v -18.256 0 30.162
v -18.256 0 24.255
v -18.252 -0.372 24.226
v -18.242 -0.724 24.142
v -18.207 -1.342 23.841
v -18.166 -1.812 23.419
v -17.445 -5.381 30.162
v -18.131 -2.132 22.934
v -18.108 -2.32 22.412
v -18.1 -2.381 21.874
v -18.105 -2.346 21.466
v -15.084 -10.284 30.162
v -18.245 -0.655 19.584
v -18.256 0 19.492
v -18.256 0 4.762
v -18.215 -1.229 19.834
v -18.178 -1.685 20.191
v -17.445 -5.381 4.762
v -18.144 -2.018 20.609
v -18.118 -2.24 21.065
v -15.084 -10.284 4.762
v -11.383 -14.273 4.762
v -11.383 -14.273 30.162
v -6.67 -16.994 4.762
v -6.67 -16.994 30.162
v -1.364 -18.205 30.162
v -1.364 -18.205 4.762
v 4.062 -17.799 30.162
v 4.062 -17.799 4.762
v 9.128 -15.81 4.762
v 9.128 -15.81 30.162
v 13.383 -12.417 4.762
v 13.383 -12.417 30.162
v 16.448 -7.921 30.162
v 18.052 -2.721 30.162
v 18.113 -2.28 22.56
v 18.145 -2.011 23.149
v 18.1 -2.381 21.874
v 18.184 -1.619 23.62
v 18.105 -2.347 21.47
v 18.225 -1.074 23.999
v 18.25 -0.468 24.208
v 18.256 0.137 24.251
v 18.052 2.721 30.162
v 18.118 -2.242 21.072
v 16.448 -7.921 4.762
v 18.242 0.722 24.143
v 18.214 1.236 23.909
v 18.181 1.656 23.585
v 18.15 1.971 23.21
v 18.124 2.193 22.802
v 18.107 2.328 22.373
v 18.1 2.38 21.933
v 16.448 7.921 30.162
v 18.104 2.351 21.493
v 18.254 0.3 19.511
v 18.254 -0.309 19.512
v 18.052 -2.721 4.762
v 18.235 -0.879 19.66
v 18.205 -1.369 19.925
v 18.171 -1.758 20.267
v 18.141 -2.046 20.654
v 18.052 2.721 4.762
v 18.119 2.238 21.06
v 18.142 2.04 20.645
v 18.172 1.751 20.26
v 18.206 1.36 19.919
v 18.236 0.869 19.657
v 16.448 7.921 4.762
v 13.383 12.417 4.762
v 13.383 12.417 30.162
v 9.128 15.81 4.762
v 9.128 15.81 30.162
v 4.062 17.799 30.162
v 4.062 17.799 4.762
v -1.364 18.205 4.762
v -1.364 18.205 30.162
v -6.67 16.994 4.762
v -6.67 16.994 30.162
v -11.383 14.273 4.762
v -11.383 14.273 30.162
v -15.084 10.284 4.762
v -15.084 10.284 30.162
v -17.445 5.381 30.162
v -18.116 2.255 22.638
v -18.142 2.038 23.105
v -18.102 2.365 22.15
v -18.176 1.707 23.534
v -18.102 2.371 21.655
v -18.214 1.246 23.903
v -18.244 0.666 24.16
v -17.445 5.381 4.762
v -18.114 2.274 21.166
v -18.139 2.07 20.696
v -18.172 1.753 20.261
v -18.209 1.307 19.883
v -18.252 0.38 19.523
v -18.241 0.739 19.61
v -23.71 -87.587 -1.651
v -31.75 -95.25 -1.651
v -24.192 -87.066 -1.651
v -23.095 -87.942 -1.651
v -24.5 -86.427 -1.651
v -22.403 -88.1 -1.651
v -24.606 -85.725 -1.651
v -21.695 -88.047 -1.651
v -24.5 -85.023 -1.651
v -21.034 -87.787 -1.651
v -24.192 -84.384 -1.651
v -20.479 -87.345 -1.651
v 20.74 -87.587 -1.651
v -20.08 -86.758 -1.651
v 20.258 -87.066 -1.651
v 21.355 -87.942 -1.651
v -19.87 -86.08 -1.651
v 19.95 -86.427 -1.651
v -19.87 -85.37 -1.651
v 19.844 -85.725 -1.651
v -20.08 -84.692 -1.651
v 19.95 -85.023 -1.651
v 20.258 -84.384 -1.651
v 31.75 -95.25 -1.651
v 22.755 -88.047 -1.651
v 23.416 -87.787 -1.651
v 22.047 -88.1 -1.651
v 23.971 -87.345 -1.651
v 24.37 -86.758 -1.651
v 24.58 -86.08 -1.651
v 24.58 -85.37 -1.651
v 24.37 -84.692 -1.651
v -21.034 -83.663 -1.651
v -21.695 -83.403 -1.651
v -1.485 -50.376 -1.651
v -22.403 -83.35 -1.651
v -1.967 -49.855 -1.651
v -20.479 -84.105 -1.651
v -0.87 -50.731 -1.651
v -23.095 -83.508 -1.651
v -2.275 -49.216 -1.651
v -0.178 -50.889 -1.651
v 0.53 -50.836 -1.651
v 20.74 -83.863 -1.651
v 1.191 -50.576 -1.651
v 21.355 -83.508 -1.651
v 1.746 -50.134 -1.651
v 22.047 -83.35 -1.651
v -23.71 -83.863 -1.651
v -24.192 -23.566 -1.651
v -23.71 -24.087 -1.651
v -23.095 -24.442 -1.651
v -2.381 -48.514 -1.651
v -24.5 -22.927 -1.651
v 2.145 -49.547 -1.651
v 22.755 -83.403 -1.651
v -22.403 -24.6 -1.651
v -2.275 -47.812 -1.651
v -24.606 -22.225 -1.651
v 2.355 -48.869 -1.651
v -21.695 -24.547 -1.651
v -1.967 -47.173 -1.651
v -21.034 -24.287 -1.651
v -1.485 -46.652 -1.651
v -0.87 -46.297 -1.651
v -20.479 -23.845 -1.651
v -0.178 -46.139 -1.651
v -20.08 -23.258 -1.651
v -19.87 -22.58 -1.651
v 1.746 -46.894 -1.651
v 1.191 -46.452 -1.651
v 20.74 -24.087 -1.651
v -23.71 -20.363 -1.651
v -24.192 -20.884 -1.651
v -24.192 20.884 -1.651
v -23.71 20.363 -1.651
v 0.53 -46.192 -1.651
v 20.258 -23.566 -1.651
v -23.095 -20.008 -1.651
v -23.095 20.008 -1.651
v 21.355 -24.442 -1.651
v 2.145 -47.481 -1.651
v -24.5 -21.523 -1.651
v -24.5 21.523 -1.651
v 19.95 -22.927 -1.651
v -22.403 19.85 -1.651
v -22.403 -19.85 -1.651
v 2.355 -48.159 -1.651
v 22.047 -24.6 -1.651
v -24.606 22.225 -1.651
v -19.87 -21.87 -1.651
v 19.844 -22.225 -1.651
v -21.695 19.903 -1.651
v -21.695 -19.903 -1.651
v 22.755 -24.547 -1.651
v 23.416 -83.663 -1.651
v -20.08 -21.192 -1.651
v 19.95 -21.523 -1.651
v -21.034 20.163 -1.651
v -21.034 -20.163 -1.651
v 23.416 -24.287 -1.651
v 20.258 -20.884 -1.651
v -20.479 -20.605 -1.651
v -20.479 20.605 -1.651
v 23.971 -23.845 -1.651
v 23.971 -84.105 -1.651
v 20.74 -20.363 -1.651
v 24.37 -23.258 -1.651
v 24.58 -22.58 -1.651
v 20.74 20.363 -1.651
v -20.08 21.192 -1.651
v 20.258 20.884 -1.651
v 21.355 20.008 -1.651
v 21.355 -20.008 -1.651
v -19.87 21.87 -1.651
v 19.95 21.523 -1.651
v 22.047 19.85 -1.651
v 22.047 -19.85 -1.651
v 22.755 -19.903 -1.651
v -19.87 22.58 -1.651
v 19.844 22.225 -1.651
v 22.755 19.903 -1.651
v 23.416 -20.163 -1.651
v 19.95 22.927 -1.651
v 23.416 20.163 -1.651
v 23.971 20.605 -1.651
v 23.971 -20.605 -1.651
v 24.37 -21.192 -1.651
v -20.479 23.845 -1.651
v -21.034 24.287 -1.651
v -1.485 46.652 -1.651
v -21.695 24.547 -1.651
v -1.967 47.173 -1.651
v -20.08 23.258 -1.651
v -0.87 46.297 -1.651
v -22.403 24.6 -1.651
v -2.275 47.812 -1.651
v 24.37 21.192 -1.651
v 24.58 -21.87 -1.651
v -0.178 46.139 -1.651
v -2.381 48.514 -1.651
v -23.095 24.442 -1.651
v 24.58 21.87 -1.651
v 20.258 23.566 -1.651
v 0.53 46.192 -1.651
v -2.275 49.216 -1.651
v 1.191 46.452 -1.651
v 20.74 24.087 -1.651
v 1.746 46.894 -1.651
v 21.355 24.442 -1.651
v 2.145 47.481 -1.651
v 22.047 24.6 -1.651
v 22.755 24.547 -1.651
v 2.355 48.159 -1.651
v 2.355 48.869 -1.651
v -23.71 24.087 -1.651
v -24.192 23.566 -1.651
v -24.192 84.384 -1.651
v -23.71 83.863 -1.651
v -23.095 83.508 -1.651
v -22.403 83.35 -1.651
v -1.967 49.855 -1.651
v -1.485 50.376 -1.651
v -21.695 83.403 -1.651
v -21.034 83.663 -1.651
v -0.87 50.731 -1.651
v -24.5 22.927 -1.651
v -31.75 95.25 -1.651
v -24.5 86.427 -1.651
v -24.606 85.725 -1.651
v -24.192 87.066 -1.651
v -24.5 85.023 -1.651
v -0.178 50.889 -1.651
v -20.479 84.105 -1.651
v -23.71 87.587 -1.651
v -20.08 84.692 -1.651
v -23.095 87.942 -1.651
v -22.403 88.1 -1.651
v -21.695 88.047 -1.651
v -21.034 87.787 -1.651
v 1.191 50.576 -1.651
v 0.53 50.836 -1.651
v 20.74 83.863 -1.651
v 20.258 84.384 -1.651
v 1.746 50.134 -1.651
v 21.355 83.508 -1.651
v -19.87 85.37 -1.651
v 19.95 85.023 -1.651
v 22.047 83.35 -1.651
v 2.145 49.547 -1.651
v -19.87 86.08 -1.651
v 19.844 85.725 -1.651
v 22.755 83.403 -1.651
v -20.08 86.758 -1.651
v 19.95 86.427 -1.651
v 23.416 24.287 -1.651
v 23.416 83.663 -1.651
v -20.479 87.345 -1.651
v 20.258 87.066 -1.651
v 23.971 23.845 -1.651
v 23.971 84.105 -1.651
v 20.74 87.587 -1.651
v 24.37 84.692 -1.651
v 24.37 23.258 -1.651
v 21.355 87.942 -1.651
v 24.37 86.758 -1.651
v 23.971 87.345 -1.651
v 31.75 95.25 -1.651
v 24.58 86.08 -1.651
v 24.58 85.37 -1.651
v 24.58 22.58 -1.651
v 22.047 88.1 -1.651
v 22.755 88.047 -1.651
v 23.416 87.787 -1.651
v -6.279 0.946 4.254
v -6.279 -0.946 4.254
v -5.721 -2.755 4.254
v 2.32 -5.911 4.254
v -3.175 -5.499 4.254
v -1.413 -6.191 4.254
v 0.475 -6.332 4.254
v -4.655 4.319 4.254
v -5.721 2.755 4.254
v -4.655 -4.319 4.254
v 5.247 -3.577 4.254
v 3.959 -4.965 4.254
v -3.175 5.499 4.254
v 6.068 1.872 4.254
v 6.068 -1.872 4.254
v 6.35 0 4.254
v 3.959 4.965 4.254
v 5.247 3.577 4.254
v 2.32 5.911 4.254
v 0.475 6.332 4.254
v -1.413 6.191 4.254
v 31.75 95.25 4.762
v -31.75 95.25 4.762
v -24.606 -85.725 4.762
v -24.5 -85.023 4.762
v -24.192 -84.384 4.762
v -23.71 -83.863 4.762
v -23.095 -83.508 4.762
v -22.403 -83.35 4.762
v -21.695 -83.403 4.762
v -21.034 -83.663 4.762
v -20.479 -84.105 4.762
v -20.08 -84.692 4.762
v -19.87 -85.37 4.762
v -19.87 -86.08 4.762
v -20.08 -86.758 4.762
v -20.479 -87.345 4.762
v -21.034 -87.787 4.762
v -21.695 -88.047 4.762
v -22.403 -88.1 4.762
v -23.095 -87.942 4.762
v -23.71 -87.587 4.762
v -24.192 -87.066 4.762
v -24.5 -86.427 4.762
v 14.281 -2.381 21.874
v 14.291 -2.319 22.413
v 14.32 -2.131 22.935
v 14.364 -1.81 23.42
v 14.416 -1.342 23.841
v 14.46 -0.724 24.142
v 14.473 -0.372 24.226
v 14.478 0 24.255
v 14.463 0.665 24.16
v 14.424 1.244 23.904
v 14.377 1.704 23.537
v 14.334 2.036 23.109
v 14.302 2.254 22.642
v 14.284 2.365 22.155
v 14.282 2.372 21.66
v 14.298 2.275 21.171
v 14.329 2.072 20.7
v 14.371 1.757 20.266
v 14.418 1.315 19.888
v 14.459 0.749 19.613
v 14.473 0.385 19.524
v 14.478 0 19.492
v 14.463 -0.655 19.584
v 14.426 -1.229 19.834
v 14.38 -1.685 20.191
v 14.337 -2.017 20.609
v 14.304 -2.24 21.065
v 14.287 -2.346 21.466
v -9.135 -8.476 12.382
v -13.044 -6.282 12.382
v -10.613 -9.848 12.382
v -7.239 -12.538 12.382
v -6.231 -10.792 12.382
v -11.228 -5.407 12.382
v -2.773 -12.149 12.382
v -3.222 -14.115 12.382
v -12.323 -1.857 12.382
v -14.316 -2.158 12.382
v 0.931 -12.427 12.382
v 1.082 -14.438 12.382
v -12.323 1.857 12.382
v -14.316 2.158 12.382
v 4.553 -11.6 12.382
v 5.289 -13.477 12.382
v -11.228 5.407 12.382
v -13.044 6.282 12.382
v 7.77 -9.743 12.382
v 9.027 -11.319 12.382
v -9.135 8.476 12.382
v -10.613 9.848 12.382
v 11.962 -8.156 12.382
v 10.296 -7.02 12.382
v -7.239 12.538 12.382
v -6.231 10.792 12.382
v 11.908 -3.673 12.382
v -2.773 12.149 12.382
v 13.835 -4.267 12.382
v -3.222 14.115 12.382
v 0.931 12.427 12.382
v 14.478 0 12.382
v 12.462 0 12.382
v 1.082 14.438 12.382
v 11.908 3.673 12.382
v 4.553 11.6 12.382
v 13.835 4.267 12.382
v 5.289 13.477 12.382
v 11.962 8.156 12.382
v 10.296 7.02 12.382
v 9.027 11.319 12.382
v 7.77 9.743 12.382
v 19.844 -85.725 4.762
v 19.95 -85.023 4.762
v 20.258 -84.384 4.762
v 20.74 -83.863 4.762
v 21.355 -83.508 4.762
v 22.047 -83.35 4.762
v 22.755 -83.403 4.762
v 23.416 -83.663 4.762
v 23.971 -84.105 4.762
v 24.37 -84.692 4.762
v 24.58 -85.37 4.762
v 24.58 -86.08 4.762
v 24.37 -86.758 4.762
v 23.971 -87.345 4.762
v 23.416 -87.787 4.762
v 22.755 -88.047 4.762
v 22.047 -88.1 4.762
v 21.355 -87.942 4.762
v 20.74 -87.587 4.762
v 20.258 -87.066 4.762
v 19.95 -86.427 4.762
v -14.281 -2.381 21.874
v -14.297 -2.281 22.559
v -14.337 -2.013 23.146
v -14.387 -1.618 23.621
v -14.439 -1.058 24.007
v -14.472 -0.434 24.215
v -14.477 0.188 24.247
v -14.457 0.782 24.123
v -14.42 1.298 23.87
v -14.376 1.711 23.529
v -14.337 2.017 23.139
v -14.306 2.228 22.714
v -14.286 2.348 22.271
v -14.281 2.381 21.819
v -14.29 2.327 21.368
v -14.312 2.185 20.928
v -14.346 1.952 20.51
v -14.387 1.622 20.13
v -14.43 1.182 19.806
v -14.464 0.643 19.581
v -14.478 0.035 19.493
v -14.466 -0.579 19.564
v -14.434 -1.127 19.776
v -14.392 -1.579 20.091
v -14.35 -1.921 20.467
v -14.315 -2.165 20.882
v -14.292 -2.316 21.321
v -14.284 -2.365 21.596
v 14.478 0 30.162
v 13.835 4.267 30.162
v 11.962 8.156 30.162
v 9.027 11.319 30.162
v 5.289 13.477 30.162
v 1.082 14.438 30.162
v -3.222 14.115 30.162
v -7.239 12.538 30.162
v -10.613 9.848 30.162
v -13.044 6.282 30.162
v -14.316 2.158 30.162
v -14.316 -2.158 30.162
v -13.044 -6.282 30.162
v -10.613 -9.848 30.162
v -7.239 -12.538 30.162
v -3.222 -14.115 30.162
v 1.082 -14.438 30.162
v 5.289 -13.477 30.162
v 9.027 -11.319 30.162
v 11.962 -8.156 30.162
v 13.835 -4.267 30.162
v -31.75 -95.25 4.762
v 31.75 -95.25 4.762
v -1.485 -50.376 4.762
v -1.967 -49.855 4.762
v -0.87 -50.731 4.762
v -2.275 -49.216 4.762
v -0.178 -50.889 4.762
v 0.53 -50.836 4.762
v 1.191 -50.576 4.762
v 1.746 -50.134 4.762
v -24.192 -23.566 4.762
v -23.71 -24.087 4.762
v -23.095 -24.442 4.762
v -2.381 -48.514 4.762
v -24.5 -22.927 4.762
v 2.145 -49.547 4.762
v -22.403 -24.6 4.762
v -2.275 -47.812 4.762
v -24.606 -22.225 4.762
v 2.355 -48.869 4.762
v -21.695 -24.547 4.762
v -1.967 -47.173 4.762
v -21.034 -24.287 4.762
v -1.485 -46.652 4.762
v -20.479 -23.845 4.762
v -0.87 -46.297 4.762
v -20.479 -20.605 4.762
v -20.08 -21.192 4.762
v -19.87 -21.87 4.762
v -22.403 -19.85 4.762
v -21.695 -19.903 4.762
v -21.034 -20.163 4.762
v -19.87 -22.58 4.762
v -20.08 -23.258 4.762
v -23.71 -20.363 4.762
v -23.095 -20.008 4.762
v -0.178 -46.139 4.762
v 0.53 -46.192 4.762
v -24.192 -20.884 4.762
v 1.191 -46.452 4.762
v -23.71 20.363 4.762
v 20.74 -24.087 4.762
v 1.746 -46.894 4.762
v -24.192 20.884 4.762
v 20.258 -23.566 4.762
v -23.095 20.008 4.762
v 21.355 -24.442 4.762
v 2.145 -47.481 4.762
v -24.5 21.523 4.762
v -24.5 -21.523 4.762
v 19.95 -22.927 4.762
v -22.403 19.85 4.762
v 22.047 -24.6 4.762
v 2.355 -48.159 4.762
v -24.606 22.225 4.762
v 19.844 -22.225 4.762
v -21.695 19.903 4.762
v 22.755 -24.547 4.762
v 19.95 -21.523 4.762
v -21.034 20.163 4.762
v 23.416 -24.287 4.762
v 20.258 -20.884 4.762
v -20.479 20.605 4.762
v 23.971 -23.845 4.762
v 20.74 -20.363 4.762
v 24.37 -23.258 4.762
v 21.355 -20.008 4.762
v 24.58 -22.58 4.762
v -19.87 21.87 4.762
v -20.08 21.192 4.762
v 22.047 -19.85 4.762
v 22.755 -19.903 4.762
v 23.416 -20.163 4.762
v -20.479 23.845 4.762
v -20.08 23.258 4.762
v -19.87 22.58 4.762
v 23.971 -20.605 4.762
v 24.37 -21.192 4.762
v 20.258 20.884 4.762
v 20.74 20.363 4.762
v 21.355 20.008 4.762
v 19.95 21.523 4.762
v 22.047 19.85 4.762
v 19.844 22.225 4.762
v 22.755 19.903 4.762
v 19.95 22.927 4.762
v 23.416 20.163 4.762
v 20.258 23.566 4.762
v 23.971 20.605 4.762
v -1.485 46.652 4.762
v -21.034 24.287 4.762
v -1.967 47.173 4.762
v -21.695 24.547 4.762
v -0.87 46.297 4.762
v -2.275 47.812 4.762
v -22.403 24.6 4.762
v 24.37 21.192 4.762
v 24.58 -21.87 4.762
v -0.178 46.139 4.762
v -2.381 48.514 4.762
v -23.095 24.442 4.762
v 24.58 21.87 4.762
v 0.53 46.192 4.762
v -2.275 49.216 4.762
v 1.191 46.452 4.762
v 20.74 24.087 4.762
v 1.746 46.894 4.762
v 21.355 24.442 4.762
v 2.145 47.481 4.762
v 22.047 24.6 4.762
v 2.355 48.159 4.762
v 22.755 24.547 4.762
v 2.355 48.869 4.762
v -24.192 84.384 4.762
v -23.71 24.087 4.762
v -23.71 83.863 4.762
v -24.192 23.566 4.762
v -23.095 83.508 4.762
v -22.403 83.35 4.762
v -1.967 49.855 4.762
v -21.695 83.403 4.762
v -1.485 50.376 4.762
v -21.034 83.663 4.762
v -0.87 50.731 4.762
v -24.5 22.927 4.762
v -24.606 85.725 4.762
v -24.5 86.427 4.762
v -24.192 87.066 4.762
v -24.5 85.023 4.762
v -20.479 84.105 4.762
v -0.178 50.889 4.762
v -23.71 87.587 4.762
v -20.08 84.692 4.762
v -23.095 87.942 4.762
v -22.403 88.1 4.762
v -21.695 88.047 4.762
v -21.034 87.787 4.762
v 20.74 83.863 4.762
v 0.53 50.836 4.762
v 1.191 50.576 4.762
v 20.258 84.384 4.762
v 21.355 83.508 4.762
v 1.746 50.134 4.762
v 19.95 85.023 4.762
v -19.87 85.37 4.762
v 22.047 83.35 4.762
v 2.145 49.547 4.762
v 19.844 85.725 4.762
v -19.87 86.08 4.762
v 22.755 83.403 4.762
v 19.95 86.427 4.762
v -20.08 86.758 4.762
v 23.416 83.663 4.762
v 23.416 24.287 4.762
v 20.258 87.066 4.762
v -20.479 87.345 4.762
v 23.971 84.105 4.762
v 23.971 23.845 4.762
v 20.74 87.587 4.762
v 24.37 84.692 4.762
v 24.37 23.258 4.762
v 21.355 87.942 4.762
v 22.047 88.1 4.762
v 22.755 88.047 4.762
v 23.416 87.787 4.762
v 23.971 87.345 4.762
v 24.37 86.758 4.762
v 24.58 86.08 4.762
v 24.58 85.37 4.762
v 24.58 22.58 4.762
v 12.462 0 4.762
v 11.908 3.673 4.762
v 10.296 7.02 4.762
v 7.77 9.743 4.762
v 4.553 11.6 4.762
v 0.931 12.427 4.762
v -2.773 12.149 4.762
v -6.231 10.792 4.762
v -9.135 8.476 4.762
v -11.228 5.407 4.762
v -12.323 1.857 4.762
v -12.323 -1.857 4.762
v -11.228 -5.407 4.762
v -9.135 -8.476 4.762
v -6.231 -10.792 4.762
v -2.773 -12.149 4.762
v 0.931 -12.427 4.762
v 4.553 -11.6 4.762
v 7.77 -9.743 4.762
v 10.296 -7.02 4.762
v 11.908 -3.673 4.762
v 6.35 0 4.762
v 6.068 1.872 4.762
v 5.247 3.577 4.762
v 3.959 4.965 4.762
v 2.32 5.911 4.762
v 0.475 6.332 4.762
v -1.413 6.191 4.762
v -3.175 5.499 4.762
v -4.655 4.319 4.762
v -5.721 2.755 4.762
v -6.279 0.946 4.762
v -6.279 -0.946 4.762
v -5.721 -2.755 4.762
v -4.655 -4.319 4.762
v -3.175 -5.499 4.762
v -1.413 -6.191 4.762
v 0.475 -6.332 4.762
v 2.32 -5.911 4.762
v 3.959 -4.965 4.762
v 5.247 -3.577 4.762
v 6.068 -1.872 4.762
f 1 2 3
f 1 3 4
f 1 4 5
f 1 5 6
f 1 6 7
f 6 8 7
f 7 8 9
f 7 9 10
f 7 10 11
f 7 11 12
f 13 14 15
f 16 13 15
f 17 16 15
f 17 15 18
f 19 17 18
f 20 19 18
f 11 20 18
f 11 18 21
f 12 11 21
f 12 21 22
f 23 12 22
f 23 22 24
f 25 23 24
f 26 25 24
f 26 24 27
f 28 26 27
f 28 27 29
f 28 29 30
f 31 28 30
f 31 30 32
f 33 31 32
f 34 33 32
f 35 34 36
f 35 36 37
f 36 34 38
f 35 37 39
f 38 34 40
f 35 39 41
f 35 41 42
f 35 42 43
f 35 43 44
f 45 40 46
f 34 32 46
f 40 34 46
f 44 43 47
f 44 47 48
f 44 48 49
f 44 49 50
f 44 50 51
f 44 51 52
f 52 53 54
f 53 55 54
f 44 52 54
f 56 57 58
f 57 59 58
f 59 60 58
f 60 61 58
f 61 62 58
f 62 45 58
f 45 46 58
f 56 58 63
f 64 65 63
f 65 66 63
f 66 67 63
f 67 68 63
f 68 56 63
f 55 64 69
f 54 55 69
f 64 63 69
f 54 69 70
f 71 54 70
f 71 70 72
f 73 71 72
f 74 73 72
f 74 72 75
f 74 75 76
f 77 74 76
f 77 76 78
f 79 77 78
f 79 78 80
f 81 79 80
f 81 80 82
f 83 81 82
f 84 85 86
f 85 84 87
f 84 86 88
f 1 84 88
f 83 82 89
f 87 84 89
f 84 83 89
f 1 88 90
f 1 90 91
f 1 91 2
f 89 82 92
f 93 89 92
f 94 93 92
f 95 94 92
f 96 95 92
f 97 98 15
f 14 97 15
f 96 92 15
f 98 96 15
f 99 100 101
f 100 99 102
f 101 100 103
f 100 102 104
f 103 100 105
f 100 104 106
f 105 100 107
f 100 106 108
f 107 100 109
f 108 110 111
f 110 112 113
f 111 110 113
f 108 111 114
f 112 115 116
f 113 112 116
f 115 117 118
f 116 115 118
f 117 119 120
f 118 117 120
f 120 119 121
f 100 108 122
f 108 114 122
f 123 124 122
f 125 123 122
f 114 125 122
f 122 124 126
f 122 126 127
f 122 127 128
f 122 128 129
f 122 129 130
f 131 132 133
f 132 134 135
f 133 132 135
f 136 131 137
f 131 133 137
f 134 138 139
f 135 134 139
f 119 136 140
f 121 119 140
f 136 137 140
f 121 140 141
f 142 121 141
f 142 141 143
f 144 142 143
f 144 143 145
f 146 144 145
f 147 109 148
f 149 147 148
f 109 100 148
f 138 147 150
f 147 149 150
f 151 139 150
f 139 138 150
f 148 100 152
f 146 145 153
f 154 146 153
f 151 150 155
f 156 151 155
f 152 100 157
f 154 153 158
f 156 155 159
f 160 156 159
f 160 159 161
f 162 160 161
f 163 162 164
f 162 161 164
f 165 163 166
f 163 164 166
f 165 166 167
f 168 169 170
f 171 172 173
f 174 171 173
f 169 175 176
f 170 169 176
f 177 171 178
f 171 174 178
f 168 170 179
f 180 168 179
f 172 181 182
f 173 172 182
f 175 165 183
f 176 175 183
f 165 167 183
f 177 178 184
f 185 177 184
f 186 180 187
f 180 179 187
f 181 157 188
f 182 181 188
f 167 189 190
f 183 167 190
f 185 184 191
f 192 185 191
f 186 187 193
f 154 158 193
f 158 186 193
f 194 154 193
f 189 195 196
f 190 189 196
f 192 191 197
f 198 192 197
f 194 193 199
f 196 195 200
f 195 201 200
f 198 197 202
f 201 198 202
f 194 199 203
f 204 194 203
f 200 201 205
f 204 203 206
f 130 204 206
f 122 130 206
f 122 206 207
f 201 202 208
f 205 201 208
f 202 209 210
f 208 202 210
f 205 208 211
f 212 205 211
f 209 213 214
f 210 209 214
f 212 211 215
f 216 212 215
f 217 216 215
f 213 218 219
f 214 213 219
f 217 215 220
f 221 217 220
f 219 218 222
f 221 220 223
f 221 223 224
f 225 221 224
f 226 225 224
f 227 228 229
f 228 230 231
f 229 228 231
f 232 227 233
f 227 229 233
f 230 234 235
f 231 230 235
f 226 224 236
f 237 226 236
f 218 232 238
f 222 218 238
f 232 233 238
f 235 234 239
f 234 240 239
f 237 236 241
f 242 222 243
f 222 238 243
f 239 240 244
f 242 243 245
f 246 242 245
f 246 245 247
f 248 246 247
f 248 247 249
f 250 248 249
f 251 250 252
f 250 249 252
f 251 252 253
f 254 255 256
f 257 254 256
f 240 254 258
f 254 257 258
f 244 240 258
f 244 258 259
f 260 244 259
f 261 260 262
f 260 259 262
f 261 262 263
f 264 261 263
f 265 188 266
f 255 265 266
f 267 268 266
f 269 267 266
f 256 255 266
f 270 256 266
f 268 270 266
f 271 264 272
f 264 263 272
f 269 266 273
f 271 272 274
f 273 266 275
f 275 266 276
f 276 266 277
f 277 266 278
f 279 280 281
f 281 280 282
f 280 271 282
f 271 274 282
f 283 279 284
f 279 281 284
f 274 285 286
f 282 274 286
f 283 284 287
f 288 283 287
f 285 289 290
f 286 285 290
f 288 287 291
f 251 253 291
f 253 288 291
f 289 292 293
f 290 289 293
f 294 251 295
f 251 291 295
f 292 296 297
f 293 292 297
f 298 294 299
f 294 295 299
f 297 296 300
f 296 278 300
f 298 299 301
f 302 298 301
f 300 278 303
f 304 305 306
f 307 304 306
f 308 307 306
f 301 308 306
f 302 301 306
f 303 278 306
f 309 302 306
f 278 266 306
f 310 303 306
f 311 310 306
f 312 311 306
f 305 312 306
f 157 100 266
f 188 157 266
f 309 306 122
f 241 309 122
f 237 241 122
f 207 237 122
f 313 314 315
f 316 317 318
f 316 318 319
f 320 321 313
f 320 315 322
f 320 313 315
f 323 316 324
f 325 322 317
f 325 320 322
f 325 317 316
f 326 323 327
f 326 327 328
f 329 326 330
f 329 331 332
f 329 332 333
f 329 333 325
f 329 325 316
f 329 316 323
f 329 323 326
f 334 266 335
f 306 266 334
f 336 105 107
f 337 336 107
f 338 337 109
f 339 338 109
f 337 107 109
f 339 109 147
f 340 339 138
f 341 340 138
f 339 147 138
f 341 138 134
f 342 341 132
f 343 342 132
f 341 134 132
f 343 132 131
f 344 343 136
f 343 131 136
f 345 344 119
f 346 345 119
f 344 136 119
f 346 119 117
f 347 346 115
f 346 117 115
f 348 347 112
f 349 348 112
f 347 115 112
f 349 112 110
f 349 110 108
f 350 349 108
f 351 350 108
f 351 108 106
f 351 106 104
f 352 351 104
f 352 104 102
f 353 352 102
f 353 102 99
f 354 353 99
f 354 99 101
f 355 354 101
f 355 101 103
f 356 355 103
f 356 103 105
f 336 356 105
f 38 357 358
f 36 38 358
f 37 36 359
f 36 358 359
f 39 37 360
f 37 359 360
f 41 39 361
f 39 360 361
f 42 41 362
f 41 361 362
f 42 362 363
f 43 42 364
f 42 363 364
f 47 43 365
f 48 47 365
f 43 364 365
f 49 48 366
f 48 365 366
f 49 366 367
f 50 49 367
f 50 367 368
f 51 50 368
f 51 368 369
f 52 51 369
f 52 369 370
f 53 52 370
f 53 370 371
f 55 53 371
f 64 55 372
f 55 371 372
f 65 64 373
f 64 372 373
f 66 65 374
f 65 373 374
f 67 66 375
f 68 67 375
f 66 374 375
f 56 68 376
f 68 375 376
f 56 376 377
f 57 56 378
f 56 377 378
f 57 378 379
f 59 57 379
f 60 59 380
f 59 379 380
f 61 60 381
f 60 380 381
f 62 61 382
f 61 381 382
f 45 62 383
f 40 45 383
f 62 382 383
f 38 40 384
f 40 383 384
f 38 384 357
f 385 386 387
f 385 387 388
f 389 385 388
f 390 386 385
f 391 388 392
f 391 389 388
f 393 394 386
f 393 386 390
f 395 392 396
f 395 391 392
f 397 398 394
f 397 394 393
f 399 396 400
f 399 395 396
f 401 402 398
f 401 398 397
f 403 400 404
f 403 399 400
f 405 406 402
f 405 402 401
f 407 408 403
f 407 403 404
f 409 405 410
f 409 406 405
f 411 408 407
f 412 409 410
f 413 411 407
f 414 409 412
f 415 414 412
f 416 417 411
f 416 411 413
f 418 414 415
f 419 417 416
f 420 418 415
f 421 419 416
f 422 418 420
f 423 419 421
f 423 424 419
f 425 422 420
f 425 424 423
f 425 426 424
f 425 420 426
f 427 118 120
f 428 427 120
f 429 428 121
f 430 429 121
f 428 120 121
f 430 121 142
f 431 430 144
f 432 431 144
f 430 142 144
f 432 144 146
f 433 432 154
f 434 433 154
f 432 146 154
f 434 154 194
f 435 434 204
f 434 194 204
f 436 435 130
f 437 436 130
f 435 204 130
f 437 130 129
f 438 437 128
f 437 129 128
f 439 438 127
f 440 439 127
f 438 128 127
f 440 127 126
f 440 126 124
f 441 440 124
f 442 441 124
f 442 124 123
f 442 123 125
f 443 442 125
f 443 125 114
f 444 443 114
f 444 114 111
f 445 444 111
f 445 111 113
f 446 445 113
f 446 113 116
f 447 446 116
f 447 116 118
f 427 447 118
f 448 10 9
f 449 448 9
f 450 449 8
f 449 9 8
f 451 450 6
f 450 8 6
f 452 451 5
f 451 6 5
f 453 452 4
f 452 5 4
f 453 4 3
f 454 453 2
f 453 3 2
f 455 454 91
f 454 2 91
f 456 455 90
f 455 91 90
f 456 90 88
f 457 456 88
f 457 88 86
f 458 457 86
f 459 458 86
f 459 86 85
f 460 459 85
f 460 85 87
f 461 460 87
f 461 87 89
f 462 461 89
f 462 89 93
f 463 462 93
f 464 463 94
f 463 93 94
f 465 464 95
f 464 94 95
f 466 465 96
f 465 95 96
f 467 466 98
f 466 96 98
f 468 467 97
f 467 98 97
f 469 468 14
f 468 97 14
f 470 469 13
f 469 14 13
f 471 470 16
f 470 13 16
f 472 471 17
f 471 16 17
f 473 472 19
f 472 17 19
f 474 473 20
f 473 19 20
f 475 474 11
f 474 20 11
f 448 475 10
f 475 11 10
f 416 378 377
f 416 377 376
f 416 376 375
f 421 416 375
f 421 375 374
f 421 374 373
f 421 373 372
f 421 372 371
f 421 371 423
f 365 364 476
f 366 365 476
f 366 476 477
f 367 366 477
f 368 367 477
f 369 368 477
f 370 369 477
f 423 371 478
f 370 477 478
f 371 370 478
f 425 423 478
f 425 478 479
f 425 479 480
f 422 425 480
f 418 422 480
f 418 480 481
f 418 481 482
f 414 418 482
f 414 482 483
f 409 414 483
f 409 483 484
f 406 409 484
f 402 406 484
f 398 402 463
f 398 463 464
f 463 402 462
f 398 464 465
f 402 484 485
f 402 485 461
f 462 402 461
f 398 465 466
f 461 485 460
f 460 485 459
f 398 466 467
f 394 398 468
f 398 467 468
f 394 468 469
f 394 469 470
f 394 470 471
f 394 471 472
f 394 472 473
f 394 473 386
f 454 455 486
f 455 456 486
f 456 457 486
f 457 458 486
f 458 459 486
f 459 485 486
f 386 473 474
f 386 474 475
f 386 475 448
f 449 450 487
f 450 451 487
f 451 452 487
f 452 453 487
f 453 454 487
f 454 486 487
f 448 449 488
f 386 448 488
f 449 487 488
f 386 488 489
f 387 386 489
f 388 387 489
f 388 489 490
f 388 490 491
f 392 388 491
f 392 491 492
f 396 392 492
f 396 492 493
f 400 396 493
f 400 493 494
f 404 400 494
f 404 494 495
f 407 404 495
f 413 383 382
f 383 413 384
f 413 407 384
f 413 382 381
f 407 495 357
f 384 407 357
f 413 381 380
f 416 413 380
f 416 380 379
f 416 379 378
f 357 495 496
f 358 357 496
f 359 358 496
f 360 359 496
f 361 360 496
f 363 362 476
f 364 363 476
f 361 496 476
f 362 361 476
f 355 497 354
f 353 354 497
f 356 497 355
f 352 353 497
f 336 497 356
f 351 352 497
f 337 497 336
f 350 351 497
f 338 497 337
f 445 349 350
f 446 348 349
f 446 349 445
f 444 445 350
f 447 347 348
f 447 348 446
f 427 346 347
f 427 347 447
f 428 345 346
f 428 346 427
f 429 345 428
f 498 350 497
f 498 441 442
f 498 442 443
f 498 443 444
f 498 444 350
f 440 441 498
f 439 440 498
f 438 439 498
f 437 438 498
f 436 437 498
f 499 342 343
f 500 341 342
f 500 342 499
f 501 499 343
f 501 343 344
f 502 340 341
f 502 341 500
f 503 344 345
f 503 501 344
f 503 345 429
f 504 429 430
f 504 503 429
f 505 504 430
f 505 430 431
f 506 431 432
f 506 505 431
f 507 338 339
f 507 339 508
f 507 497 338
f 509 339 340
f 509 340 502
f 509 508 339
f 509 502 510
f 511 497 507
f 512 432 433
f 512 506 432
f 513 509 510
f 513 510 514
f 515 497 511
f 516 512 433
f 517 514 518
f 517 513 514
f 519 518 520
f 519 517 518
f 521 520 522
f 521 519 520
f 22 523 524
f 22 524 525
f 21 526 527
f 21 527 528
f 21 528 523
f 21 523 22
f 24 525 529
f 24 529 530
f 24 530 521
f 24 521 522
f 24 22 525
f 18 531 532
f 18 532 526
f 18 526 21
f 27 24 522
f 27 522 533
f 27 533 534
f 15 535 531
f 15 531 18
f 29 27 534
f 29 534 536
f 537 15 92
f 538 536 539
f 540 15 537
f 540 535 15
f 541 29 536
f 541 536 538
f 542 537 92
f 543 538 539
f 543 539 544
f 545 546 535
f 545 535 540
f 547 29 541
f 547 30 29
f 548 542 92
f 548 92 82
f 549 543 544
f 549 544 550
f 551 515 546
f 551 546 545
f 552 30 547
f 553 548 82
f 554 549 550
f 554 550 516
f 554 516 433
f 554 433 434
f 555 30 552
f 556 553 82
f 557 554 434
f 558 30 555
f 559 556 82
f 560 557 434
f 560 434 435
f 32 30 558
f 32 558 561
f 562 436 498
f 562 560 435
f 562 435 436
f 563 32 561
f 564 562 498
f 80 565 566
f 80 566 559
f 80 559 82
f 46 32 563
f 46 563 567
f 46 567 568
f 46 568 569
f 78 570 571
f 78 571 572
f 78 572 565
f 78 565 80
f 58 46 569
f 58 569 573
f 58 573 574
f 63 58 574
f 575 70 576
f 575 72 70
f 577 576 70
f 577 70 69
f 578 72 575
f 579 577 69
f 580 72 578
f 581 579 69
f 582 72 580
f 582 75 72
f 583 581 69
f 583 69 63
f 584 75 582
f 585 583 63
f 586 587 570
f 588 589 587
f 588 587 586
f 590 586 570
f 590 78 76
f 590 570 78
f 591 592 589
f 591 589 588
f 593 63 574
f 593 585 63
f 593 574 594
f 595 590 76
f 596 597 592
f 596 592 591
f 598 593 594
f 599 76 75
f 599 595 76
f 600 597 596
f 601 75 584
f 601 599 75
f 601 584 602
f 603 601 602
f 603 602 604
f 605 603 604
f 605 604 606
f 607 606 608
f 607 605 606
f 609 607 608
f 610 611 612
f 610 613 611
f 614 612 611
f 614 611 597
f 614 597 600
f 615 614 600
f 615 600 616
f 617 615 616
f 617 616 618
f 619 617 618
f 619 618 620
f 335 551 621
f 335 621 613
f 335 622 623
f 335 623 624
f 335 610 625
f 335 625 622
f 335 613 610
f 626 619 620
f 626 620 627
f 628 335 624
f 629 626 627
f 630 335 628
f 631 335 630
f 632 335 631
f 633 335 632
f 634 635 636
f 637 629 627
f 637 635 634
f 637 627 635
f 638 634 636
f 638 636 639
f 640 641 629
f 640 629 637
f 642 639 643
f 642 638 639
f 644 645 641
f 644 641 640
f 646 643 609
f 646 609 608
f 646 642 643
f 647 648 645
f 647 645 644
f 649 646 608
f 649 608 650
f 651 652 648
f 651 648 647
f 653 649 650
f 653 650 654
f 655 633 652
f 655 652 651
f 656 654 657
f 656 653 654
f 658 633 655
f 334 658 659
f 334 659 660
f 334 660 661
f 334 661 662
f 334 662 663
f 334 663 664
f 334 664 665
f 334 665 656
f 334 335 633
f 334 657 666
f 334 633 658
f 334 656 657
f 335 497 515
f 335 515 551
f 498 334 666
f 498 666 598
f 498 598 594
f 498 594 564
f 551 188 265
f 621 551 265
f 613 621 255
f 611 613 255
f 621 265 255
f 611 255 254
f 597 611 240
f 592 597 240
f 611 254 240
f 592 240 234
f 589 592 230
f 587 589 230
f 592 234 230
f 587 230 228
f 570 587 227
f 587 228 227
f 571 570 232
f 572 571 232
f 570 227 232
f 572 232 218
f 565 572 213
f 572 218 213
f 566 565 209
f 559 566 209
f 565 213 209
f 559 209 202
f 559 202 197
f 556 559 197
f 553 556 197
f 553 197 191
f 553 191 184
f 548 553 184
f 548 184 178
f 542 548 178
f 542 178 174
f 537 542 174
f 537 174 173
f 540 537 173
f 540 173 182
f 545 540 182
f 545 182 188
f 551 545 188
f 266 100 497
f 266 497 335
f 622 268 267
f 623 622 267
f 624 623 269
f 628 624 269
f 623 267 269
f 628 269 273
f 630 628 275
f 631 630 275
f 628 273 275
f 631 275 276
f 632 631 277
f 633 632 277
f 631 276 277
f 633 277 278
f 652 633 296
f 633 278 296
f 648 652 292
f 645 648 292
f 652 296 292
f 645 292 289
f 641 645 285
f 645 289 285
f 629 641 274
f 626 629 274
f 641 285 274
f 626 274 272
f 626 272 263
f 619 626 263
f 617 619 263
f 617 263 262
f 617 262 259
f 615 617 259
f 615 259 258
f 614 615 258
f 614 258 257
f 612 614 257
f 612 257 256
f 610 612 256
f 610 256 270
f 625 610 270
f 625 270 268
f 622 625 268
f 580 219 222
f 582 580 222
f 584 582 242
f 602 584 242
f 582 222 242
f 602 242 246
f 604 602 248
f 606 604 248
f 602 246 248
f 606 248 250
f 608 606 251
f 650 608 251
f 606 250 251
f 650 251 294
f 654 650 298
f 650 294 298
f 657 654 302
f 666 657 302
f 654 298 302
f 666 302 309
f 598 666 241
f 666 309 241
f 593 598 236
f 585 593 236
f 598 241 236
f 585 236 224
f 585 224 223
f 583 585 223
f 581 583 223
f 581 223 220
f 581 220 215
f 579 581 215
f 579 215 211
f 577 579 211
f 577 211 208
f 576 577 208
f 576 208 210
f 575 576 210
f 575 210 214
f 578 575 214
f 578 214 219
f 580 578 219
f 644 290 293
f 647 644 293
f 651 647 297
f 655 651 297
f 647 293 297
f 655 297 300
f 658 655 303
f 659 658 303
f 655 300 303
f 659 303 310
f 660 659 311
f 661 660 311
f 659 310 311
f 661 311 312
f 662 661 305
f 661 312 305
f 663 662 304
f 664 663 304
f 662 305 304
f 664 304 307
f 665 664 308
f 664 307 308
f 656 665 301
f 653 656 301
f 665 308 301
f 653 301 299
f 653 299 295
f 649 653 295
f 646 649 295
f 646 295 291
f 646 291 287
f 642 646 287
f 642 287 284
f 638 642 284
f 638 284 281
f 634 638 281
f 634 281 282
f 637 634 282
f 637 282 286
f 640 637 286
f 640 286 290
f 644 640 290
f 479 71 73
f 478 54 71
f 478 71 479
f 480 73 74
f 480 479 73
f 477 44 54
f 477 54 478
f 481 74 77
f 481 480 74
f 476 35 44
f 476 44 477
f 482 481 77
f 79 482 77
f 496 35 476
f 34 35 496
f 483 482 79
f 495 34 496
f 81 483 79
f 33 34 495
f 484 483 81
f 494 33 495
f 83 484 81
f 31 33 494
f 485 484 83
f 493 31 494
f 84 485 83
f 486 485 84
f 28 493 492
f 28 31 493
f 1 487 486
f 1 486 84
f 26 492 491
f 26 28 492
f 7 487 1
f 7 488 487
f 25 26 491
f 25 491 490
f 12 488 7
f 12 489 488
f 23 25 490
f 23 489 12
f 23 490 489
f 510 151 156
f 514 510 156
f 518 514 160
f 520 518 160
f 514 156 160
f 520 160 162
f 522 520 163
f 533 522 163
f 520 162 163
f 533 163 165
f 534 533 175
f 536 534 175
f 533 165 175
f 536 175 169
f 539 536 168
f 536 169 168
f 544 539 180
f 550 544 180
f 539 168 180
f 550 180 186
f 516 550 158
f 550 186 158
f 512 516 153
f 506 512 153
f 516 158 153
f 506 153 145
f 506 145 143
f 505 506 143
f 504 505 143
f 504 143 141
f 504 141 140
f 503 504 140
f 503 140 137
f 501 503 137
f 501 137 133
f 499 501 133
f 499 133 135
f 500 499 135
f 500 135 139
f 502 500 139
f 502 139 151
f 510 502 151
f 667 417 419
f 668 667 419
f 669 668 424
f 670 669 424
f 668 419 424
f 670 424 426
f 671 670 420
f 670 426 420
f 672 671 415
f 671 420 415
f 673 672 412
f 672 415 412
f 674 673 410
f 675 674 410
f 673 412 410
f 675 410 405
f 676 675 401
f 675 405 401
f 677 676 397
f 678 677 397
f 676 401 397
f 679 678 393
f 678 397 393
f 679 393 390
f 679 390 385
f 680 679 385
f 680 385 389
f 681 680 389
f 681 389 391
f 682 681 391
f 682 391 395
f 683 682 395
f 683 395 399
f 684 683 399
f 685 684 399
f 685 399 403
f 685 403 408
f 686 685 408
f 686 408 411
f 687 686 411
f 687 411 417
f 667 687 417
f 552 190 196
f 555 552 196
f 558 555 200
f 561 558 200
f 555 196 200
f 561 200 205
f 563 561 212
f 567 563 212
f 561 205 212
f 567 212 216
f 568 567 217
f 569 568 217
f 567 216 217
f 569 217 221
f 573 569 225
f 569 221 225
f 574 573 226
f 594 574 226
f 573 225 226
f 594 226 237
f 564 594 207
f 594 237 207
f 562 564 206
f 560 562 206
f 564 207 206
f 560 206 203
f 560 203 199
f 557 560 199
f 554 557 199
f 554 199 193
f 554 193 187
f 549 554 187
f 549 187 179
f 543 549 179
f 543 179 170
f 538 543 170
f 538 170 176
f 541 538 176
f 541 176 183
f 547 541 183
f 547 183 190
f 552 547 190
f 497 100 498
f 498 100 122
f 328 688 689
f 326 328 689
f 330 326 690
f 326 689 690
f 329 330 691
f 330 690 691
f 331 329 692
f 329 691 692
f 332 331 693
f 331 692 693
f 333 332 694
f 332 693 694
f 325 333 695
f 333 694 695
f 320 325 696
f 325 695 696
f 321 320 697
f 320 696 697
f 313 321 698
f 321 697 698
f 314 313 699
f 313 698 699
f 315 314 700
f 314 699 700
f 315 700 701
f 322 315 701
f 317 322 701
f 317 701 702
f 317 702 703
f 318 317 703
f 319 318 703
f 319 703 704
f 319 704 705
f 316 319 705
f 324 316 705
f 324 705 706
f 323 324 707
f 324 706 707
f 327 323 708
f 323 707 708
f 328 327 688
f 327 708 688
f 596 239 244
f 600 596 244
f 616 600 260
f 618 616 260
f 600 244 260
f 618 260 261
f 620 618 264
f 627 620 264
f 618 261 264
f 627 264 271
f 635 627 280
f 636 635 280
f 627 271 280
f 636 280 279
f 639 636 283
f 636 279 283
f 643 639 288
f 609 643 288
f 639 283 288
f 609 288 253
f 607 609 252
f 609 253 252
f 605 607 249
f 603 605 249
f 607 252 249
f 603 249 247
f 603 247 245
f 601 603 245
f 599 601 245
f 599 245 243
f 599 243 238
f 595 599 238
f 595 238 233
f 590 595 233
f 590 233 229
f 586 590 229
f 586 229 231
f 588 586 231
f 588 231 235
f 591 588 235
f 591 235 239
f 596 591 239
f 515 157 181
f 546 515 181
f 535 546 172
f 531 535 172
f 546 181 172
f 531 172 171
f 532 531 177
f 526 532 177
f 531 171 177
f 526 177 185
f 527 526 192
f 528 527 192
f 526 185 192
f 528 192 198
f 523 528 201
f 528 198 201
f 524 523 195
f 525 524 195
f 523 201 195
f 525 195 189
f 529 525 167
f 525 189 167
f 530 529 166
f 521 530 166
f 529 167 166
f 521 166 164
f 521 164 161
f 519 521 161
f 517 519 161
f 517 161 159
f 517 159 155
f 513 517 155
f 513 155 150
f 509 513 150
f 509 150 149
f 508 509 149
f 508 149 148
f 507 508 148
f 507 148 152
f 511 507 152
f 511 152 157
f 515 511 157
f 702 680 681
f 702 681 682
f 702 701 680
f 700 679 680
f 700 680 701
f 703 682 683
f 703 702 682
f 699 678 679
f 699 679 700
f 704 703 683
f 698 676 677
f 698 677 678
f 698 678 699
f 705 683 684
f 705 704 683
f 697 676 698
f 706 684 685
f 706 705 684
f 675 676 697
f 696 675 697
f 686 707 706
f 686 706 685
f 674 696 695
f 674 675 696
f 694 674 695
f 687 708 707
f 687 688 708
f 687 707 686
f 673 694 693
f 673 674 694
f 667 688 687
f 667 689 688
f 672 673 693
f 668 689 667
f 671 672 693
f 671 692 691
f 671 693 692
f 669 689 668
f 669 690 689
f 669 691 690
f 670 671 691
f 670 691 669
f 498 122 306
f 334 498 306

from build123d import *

# Parameters (mm, degrees)
BOSS_EXTRUDE1_DEPTH            = 4.7625
BOSS_EXTRUDE1_DEPTH_BACK       = 1.651
SKETCH1_W                      = 63.5
SKETCH1_H                      = 190.5
SKETCH3_R                      = 6.35
CUT_EXTRUDE1_DEPTH             = 0.508
SKETCH4_R                      = 18.25625
BOSS_EXTRUDE2_DEPTH            = 38.1
SKETCH5_R                      = 12.461875
CUT_EXTRUDE2_DEPTH             = 38.1
SKETCH7_R                      = 14.2875
CUT_EXTRUDE3_DEPTH             = 30.48
F_3_16_0_1875_DIAMETER_HOLE1_D = 4.7625
SKETCH13_R                     = 14.478
CUT_EXTRUDE4_DEPTH             = 30.48
CUT_EXTRUDE5_START             = -12.7
SKETCH14_R                     = 18.25625
CUT_EXTRUDE5_DEPTH             = 12.7
F_3_16_0_1875_DIAMETER_HOLE3_D = 4.7625


with BuildPart() as part:
    # Sketch1 → Boss-Extrude1 (new, two sides: drawn at the far end of the back side and taken through both)
    with BuildSketch(Plane.XY.offset(-BOSS_EXTRUDE1_DEPTH_BACK)):
        Rectangle(SKETCH1_W, SKETCH1_H)
    extrude(amount=BOSS_EXTRUDE1_DEPTH + BOSS_EXTRUDE1_DEPTH_BACK)

    # Sketch3 → Cut-Extrude1 (cut)
    with BuildSketch(Plane.XY.offset(4.7625)):
        Circle(SKETCH3_R)
    extrude(amount=-CUT_EXTRUDE1_DEPTH, mode=Mode.SUBTRACT)

    # Sketch4 → Boss-Extrude2 (add)
    with BuildSketch(Plane.XY.offset(4.7625)):
        with Locations(Location((0, 0, 0), (0, 0, 180))):
            Circle(SKETCH4_R)
    extrude(amount=BOSS_EXTRUDE2_DEPTH)

    # Sketch5 → Cut-Extrude2 (cut)
    with BuildSketch(Plane.XY.offset(42.8625)):
        Circle(SKETCH5_R)
    extrude(amount=-CUT_EXTRUDE2_DEPTH, mode=Mode.SUBTRACT)

    # Sketch7 → Cut-Extrude3 (cut)
    with BuildSketch(Plane.XY.offset(42.8625)):
        Circle(SKETCH7_R)
    extrude(amount=-CUT_EXTRUDE3_DEPTH, mode=Mode.SUBTRACT)

    # 3/16 (0.1875) Diameter Hole1 (through all)
    with Locations(Plane.XY.offset(4.7625)):
        with Locations((-22.225, 85.725), (-22.225, -85.725), (22.225, -85.725), (22.225, 85.725), (0, 48.514), (0, -48.514), (-22.225, 22.225), (-22.225, -22.225), (22.225, -22.225), (22.225, 22.225)):
            Hole(F_3_16_0_1875_DIAMETER_HOLE1_D / 2)

    # Sketch13 → Cut-Extrude4 (cut)
    with BuildSketch(Plane.XY.offset(42.8625)):
        Circle(SKETCH13_R)
    extrude(amount=-CUT_EXTRUDE4_DEPTH, mode=Mode.SUBTRACT)

    # Sketch14 → Cut-Extrude5 (cut)
    with BuildSketch(Plane.XY.offset(42.8625).offset(CUT_EXTRUDE5_START)):
        with Locations(Location((0, 0, 0), (0, 0, 180))):
            Circle(SKETCH14_R)
    extrude(amount=CUT_EXTRUDE5_DEPTH, mode=Mode.SUBTRACT)

    # 3/16 (0.1875) Diameter Hole3 (through all)
    with Locations(Plane(origin=(18.25625, 0, 21.873504095), x_dir=(0, 1, 0), z_dir=(1, 0, 0))):
        with Locations((0, 0)):
            Hole(F_3_16_0_1875_DIAMETER_HOLE3_D / 2)


solid = part.part
